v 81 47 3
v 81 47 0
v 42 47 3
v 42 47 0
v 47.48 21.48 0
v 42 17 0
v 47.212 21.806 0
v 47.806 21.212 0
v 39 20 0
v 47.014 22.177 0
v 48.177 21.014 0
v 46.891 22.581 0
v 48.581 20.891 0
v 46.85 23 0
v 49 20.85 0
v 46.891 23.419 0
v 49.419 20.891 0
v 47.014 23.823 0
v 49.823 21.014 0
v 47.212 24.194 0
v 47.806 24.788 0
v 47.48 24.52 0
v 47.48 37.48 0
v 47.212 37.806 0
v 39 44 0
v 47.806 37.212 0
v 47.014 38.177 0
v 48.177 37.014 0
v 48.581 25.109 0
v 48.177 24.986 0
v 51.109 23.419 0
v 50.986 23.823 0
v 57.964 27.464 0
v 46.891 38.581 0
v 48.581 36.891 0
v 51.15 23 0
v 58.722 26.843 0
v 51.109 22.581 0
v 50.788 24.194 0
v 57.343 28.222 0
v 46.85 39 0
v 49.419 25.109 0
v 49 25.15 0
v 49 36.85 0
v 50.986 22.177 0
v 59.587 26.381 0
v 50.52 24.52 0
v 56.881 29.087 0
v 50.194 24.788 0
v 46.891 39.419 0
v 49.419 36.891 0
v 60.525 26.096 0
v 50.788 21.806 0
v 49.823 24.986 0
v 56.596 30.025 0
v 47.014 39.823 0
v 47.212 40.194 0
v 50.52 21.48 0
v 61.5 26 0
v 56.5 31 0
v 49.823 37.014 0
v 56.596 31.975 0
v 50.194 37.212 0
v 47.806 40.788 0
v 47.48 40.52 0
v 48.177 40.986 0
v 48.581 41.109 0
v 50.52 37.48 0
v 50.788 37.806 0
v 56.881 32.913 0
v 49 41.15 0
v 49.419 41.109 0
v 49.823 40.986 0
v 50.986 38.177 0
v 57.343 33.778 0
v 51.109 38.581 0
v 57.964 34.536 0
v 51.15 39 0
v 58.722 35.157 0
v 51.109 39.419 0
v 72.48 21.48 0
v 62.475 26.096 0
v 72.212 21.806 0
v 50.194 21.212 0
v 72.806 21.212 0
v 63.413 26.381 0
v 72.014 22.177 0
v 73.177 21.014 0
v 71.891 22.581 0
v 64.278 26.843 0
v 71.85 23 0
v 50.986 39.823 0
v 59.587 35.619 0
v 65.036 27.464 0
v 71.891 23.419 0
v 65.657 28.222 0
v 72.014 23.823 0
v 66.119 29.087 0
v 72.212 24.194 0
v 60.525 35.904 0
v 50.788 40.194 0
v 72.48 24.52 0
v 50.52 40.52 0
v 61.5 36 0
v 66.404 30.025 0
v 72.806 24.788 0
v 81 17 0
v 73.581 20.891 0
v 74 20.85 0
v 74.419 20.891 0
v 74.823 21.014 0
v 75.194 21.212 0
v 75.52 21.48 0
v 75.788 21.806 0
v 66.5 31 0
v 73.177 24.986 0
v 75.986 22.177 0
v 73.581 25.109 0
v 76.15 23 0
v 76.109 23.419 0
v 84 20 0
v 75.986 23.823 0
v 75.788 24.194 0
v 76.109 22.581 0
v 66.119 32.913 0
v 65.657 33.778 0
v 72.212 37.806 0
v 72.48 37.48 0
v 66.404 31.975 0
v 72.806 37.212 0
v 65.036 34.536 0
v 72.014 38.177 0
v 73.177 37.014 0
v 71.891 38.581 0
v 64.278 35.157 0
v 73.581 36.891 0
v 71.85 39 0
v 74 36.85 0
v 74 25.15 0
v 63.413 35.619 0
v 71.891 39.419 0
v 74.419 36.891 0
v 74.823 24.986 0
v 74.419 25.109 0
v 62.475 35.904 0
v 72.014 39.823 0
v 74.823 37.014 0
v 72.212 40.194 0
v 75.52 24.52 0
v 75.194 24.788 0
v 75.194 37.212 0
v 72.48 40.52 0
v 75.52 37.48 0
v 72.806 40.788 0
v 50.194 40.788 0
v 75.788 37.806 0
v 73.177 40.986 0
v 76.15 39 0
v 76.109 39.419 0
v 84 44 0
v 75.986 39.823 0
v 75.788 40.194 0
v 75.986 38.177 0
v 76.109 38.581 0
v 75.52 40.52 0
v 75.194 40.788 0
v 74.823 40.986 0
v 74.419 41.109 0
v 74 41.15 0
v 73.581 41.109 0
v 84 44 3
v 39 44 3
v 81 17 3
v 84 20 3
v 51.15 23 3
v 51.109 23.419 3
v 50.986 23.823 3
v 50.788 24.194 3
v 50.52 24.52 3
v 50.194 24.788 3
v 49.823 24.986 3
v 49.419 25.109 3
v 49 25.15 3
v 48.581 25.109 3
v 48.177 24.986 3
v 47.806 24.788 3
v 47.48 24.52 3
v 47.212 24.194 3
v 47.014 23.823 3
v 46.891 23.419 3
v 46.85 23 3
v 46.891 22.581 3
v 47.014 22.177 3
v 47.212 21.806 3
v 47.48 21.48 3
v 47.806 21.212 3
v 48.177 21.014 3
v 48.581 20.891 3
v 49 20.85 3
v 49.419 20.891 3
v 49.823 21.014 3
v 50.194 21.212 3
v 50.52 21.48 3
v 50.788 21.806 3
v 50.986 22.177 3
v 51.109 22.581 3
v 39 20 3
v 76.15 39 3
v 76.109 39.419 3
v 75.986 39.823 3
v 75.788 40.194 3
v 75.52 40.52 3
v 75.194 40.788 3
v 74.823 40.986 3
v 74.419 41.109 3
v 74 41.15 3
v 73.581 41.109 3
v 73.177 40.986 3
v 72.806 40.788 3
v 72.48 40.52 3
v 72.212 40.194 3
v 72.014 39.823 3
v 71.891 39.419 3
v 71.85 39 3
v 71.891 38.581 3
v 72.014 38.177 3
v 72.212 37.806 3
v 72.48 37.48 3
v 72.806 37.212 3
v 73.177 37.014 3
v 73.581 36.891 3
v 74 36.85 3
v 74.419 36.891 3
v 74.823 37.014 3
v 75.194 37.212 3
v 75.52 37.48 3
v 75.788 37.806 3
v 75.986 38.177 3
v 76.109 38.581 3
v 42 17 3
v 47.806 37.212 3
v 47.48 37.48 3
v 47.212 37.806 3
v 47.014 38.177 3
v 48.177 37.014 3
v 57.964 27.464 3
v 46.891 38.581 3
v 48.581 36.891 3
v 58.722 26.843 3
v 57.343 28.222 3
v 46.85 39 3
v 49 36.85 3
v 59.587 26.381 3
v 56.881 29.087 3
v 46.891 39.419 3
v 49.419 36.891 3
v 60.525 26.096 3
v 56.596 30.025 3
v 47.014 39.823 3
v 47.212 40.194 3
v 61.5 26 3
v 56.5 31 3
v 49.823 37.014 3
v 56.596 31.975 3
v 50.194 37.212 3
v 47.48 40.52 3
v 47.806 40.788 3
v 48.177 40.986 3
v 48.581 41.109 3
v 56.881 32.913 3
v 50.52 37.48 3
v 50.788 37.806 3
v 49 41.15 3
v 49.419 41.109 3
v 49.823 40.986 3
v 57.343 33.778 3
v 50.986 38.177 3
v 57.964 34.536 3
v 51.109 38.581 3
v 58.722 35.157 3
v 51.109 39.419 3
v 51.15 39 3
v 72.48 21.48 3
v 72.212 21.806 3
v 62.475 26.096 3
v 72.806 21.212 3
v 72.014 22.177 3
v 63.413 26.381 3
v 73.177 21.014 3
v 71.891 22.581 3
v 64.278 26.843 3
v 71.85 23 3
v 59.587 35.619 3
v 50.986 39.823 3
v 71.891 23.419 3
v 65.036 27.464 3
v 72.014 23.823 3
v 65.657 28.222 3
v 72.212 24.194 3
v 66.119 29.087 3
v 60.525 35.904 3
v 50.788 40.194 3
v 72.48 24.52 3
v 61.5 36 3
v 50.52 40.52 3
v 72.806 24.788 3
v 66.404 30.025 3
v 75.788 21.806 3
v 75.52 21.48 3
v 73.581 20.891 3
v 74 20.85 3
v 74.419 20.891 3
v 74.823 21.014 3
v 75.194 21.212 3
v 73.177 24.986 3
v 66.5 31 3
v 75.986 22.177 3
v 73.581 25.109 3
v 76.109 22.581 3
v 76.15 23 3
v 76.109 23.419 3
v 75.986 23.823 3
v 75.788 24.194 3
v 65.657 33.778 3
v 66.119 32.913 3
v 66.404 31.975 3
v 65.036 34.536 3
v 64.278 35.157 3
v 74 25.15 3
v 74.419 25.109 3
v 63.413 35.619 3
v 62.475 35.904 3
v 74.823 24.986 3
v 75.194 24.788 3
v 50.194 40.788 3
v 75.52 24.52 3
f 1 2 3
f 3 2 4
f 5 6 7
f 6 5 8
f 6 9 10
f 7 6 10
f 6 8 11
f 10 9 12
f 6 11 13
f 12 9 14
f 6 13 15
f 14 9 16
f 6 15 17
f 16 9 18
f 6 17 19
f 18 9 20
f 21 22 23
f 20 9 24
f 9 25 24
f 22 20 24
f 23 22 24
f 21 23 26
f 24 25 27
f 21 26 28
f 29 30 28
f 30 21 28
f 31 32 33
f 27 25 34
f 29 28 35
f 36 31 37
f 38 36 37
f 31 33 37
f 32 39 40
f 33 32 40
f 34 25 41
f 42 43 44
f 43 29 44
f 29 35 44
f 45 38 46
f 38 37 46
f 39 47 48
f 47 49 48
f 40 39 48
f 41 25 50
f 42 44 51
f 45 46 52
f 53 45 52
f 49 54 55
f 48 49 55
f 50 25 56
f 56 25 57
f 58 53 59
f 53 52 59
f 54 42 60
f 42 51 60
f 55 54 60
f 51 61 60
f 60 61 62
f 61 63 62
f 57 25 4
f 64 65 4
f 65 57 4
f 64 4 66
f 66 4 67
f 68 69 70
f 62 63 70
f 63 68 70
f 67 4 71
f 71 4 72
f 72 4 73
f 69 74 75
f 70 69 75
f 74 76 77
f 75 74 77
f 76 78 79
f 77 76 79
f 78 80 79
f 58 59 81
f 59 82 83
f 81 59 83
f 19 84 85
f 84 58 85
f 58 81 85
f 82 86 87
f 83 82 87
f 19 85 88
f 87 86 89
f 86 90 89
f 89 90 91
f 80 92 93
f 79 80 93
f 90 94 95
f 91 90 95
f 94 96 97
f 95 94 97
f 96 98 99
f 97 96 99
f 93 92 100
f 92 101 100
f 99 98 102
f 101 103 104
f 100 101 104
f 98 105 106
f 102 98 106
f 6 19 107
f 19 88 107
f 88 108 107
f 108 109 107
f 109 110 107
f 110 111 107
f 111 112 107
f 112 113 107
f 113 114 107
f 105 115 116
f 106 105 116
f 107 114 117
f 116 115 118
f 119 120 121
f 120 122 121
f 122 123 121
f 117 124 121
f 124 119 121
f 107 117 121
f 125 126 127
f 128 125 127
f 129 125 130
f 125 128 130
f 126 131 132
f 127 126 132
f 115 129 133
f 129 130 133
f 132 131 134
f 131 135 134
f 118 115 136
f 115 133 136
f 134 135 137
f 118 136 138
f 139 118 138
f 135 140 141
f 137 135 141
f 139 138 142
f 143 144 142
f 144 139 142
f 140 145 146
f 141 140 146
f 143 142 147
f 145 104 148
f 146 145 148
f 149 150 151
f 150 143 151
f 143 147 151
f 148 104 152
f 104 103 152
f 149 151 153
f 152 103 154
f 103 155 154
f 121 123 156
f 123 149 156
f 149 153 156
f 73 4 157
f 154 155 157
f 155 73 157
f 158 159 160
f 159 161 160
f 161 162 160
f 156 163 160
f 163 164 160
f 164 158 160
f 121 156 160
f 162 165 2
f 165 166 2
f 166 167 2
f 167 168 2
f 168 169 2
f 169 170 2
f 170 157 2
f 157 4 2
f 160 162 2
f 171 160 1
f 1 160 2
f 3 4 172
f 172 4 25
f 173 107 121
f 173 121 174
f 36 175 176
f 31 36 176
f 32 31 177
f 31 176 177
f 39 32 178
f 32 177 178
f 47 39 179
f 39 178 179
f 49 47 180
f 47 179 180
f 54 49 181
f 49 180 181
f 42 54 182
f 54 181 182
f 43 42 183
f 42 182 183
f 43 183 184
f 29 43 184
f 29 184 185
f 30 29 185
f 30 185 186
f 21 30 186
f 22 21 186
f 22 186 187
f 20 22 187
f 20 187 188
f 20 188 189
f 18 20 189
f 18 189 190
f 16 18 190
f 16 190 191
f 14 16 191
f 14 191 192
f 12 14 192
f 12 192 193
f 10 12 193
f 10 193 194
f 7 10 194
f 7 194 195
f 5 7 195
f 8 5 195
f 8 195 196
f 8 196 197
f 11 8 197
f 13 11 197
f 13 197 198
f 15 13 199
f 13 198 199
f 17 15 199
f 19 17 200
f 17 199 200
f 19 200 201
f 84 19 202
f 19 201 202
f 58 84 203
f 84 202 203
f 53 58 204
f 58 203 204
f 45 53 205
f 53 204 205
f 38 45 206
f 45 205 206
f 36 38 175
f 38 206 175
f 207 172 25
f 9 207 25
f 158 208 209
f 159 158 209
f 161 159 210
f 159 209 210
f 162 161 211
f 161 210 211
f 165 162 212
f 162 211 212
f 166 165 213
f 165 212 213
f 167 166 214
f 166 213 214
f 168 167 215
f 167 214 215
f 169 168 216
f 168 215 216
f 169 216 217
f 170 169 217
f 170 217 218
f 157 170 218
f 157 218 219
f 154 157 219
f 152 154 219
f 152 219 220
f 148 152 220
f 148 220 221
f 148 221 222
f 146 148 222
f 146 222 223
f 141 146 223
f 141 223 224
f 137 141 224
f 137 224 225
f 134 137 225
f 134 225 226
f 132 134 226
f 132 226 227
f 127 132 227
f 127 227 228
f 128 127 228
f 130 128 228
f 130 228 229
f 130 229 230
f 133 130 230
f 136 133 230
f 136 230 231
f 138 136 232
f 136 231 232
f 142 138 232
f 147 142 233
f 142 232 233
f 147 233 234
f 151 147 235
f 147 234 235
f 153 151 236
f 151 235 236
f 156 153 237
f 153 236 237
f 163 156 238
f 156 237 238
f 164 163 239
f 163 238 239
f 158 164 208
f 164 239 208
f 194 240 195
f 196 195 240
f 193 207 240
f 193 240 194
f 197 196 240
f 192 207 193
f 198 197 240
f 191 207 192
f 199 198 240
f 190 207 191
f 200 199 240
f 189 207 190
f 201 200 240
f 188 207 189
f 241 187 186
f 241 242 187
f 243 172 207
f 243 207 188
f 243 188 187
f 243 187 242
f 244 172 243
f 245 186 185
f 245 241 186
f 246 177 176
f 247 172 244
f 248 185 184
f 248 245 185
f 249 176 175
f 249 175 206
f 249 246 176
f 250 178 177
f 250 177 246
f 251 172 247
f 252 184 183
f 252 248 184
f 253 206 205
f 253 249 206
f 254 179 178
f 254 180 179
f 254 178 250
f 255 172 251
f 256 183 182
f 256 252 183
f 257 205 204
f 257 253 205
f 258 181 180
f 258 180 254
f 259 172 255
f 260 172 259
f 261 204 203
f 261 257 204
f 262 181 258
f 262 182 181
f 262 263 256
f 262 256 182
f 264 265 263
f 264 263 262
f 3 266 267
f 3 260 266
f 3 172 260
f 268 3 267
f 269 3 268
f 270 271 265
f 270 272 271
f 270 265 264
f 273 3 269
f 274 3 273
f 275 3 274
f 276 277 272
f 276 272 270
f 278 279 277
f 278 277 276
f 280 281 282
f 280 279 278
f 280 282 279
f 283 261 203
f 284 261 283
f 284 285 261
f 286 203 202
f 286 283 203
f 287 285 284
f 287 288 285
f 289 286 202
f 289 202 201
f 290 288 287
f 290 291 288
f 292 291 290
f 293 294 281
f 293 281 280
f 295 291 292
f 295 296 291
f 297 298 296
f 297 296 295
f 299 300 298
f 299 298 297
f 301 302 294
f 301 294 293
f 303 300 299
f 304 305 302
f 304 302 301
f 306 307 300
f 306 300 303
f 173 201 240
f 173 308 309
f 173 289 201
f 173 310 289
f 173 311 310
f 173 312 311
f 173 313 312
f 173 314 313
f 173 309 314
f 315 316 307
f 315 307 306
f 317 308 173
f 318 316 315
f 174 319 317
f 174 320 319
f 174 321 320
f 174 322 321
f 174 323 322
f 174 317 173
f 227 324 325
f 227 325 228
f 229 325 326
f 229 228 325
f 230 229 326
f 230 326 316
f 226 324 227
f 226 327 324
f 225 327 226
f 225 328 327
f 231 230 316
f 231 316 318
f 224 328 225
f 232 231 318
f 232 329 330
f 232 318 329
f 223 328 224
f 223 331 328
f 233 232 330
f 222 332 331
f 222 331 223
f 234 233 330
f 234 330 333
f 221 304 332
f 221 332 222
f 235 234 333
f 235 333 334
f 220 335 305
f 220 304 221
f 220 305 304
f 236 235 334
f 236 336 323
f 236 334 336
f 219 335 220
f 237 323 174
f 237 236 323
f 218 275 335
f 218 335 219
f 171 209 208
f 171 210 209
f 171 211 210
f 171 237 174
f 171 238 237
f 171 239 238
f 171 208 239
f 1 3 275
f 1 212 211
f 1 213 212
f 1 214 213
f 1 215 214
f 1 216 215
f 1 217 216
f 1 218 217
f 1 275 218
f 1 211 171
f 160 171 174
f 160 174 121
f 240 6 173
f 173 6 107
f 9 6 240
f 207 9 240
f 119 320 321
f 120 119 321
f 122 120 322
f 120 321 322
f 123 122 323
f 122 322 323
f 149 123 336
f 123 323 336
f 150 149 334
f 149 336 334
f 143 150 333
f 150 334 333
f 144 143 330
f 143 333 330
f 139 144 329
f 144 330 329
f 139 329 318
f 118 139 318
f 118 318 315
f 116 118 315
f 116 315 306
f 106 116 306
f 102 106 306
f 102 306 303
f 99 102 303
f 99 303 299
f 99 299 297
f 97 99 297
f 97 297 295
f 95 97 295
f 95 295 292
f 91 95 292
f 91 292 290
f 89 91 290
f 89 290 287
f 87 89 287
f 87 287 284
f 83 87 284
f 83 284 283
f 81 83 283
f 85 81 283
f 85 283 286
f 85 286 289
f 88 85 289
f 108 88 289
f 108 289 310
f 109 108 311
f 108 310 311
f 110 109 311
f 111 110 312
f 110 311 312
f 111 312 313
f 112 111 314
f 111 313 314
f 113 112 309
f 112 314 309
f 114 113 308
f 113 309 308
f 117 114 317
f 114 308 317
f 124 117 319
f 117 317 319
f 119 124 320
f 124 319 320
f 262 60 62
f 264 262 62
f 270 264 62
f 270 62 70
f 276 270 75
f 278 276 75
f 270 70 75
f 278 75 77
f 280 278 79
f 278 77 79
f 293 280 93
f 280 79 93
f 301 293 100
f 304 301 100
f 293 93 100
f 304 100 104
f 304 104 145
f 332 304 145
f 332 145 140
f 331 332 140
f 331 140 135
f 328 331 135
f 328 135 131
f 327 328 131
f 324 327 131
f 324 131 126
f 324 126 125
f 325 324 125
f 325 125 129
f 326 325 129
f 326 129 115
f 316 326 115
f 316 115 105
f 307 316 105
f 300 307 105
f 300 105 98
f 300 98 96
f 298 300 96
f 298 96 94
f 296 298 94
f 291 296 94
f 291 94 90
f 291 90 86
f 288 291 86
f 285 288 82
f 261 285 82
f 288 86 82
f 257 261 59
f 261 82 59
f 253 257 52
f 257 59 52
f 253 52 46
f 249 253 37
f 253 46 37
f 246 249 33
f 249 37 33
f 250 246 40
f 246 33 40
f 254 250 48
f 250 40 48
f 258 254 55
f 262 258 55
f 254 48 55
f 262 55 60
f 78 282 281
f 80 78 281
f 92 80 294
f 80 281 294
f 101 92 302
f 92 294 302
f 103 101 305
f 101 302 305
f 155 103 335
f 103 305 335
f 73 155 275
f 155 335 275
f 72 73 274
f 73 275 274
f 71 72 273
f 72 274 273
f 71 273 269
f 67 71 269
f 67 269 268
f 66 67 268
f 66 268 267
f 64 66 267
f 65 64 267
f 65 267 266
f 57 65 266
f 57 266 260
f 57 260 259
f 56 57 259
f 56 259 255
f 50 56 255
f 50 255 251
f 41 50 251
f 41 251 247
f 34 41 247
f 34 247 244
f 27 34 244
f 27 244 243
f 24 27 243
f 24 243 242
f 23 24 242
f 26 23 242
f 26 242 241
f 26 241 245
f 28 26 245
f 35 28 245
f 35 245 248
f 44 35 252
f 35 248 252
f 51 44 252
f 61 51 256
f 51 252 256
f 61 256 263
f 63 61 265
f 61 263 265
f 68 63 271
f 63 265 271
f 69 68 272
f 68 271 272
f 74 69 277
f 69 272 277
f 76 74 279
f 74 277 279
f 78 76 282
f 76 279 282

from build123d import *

# Parameters (mm, degrees)
SKETCH_1_W               = 33
SKETCH_1_H               = 47
SKETCH_1_R               = 5
EXTRUDE_1_DEPTH          = 4
EXTRUDE_2_DEPTH          = 30
SKETCH_4_W               = 33
SKETCH_4_H               = 38
EXTRUDE_3_DEPTH          = 4
CHAMFER_1_SIZE           = 3
SKETCH_5_W               = 10
SKETCH_5_H               = 30
EXTRUDE_4_DEPTH          = 6
SKETCH_6_R               = 2.15
CUT_EXTRUDE_1_DEPTH      = 88.143559716
SKETCH_7_R               = 2.15
CUT_EXTRUDE_2_DEPTH      = 60
SKETCH_8_W               = 142.872393379
SKETCH_8_H               = 129.651084076
CUT_EXTRUDE_3_DEPTH      = 88.143559716
CUT_EXTRUDE_START        = -26
SKETCH_9_W               = 6
SKETCH_9_H               = 85
SKETCH_9_H_2             = 55
CUT_EXTRUDE_4_DEPTH      = 26
SKETCH_10_R              = 6.65
EXTRUDE_5_DEPTH          = 5.2
EXTRUDE_6_DEPTH          = 6
CHAMFER_2_SIZE           = 5.2
EXTRUDE_START            = -6
SKETCH_12_R              = 2.15
EXTRUDE_7_DEPTH          = 6
SKETCH_13_R              = 2.15
CUT_EXTRUDE_5_DEPTH      = 110.424128966
CUT_EXTRUDE_6_DEPTH      = 110.424128966
CUT_EXTRUDE_6_DEPTH_BACK = 110.424128966
SKETCH_14_W              = 45
SKETCH_14_H              = 81.938700875
SKETCH_15_W              = 48.923705392
SKETCH_15_H              = 34.943280138
CUT_EXTRUDE_7_DEPTH      = 6.2
CHAMFER_3_SIZE           = 3


with BuildPart() as part:
    # 草图1 → 凸台-拉伸1 (new body)
    with BuildSketch(Plane.XY):
        with Locations((16.5, 23.5)):
            Rectangle(SKETCH_1_W, SKETCH_1_H)
        with Locations((16.5, 31)):
            Circle(SKETCH_1_R, mode=Mode.SUBTRACT)
    extrude(amount=EXTRUDE_1_DEPTH)

    # 草图3 → 凸台-拉伸2 (add)
    with BuildSketch(Plane(origin=(0, 0, 0), x_dir=(-1, 0, 0), z_dir=(0, 0, -1))):
        Polygon((0, -38), (-33, -38), (-33, 47), (-39, 47), (-39, -63), (-26.75, -63), (-26.75, -43), (-6.25, -43), (-6.25, -63), (6, -63), (6, 47), (0, 47), align=None)
    extrude(amount=-EXTRUDE_2_DEPTH)

    # 草图4 → 凸台-拉伸3 (add)
    with BuildSketch(Plane(origin=(0, 0, 0), x_dir=(-1, 0, 0), z_dir=(0, 0, -1))):
        with Locations((-16.5, -19)):
            Rectangle(SKETCH_4_W, SKETCH_4_H)
    extrude(amount=-EXTRUDE_3_DEPTH)

    # 倒角1
    chamfer_1_edges = [part.edges().sort_by_distance(p)[0] for p in [
        (-6, 47, 15),
        (-6, -63, 15),
        (39, -63, 15),
        (39, 47, 15),
    ]]
    chamfer(chamfer_1_edges, length=CHAMFER_1_SIZE)

    # 草图5 → 凸台-拉伸4 (add)
    with BuildSketch(Plane(origin=(39, 0, 0), x_dir=(0, 0, -1), z_dir=(1, 0, 0))):
        with Locations((-35, -23)):
            Rectangle(SKETCH_5_W, SKETCH_5_H)
    extrude(amount=-EXTRUDE_4_DEPTH)

    # 草图6 → 切除-拉伸1 (cut, through all)
    with BuildSketch(Plane(origin=(39, 0, 0), x_dir=(0, 0, -1), z_dir=(1, 0, 0))):
        with Locations(Location((-11, -32, 0), (0, 0, 90))):
            Circle(SKETCH_6_R)
        with Locations(Location((-35, -32, 0), (0, 0, 90))):
            Circle(SKETCH_6_R)
        with Locations(Location((-11, -14, 0), (0, 0, 90))):
            Circle(SKETCH_6_R)
        with Locations(Location((-35, -14, 0), (0, 0, 90))):
            Circle(SKETCH_6_R)
    extrude(amount=-CUT_EXTRUDE_1_DEPTH, mode=Mode.SUBTRACT)

    # 草图7 → 切除-拉伸2 (cut)
    with BuildSketch(Plane.ZY.offset(6)):
        with Locations(Location((15, -53, 0), (0, 0, 270))):
            Circle(SKETCH_7_R)
    extrude(amount=-CUT_EXTRUDE_2_DEPTH, mode=Mode.SUBTRACT)

    # 镜向1: part across plane


with BuildPart() as part_1:
    add(part.part)
    add(part.part.mirror(Plane(origin=(39, 0, 0), x_dir=(0, 0, 1), z_dir=(1, 0, 0))))

    # 草图8 → 切除-拉伸3 (cut, through all)
    with BuildSketch(Plane(origin=(39, 0, 0), x_dir=(0, 0, -1), z_dir=(1, 0, 0))):
        with Locations((-14.281868294, -7.269848701)):
            Rectangle(SKETCH_8_W, SKETCH_8_H)
    extrude(amount=-CUT_EXTRUDE_3_DEPTH, mode=Mode.SUBTRACT)

    # 草图9 → 切除-拉伸4 (cut)
    with BuildSketch(Plane.XY.offset(30).offset(CUT_EXTRUDE_START)):
        with Locations((81, 4.5)):
            Rectangle(SKETCH_9_W, SKETCH_9_H)
        with Locations((42, 19.5)):
            Rectangle(SKETCH_9_W, SKETCH_9_H_2)
    extrude(amount=CUT_EXTRUDE_4_DEPTH, mode=Mode.SUBTRACT)

    # 草图10 → 凸台-拉伸5 (add)
    with BuildSketch(Plane.XY.offset(4)):
        Polygon((42, 47), (39, 44), (39, 17), (84, 17), (84, 44), (81, 47), align=None)
        with Locations((61.5, 31)):
            Circle(SKETCH_10_R, mode=Mode.SUBTRACT)
    extrude(amount=EXTRUDE_5_DEPTH)

    # 草图11 → 凸台-拉伸6 (add)
    with BuildSketch(Plane.ZY.offset(-39)):
        Polygon((40, -8), (4, -8), (4, 17), (9.2, 17), align=None)
    extrude(amount=-EXTRUDE_6_DEPTH)

    # 倒角2
    chamfer_2_edges = [part_1.edges().sort_by_distance(p)[0] for p in [
        (64.5, 17, 4),
    ]]
    chamfer(chamfer_2_edges, length=CHAMFER_2_SIZE - 0.0001)  # a hair under: the kernel refuses the full size

    # 草图12 → 凸台-拉伸7 (add)
    with BuildSketch(Plane(origin=(84, 0, 0), x_dir=(0, 0, -1), z_dir=(1, 0, 0)).offset(EXTRUDE_START)):
        Polygon((-30, -38), (-4, -38), (-4, -13), align=None)
        with Locations(Location((-11, -32, 0), (0, 0, 90))):
            Circle(SKETCH_12_R, mode=Mode.SUBTRACT)
    extrude(amount=EXTRUDE_7_DEPTH)

    # 草图13 → 切除-拉伸5 (cut, through all)
    with BuildSketch(Plane.XY.offset(9.2)):
        with Locations((49, 39)):
            Circle(SKETCH_13_R)
        with Locations((49, 23)):
            Circle(SKETCH_13_R)
        with Locations((74, 39)):
            Circle(SKETCH_13_R)
        with Locations((74, 23)):
            Circle(SKETCH_13_R)
    extrude(amount=-CUT_EXTRUDE_5_DEPTH, mode=Mode.SUBTRACT)

    # 草图14 → 切除-拉伸6 (cut, two sides: drawn at the far end of the back side and taken through both)
    with BuildSketch(Plane.XY.offset(9.2).offset(-CUT_EXTRUDE_6_DEPTH_BACK)):
        with Locations((61.5, -23.969350438)):
            Rectangle(SKETCH_14_W, SKETCH_14_H)
    extrude(amount=CUT_EXTRUDE_6_DEPTH + CUT_EXTRUDE_6_DEPTH_BACK, mode=Mode.SUBTRACT)

    # 草图15 → 切除-拉伸7 (cut)
    with BuildSketch(Plane.XY.offset(9.2)):
        with Locations((63.461852696, 34.471640069)):
            Rectangle(SKETCH_15_W, SKETCH_15_H)
    extrude(amount=-CUT_EXTRUDE_7_DEPTH, mode=Mode.SUBTRACT)

    # 倒角3
    chamfer_3_edges = [part_1.edges().sort_by_distance(p)[0] for p in [
        (84, 17, 1.5),
        (39, 17, 1.5),
    ]]
    chamfer(chamfer_3_edges, length=CHAMFER_3_SIZE)


solid = part_1.part
